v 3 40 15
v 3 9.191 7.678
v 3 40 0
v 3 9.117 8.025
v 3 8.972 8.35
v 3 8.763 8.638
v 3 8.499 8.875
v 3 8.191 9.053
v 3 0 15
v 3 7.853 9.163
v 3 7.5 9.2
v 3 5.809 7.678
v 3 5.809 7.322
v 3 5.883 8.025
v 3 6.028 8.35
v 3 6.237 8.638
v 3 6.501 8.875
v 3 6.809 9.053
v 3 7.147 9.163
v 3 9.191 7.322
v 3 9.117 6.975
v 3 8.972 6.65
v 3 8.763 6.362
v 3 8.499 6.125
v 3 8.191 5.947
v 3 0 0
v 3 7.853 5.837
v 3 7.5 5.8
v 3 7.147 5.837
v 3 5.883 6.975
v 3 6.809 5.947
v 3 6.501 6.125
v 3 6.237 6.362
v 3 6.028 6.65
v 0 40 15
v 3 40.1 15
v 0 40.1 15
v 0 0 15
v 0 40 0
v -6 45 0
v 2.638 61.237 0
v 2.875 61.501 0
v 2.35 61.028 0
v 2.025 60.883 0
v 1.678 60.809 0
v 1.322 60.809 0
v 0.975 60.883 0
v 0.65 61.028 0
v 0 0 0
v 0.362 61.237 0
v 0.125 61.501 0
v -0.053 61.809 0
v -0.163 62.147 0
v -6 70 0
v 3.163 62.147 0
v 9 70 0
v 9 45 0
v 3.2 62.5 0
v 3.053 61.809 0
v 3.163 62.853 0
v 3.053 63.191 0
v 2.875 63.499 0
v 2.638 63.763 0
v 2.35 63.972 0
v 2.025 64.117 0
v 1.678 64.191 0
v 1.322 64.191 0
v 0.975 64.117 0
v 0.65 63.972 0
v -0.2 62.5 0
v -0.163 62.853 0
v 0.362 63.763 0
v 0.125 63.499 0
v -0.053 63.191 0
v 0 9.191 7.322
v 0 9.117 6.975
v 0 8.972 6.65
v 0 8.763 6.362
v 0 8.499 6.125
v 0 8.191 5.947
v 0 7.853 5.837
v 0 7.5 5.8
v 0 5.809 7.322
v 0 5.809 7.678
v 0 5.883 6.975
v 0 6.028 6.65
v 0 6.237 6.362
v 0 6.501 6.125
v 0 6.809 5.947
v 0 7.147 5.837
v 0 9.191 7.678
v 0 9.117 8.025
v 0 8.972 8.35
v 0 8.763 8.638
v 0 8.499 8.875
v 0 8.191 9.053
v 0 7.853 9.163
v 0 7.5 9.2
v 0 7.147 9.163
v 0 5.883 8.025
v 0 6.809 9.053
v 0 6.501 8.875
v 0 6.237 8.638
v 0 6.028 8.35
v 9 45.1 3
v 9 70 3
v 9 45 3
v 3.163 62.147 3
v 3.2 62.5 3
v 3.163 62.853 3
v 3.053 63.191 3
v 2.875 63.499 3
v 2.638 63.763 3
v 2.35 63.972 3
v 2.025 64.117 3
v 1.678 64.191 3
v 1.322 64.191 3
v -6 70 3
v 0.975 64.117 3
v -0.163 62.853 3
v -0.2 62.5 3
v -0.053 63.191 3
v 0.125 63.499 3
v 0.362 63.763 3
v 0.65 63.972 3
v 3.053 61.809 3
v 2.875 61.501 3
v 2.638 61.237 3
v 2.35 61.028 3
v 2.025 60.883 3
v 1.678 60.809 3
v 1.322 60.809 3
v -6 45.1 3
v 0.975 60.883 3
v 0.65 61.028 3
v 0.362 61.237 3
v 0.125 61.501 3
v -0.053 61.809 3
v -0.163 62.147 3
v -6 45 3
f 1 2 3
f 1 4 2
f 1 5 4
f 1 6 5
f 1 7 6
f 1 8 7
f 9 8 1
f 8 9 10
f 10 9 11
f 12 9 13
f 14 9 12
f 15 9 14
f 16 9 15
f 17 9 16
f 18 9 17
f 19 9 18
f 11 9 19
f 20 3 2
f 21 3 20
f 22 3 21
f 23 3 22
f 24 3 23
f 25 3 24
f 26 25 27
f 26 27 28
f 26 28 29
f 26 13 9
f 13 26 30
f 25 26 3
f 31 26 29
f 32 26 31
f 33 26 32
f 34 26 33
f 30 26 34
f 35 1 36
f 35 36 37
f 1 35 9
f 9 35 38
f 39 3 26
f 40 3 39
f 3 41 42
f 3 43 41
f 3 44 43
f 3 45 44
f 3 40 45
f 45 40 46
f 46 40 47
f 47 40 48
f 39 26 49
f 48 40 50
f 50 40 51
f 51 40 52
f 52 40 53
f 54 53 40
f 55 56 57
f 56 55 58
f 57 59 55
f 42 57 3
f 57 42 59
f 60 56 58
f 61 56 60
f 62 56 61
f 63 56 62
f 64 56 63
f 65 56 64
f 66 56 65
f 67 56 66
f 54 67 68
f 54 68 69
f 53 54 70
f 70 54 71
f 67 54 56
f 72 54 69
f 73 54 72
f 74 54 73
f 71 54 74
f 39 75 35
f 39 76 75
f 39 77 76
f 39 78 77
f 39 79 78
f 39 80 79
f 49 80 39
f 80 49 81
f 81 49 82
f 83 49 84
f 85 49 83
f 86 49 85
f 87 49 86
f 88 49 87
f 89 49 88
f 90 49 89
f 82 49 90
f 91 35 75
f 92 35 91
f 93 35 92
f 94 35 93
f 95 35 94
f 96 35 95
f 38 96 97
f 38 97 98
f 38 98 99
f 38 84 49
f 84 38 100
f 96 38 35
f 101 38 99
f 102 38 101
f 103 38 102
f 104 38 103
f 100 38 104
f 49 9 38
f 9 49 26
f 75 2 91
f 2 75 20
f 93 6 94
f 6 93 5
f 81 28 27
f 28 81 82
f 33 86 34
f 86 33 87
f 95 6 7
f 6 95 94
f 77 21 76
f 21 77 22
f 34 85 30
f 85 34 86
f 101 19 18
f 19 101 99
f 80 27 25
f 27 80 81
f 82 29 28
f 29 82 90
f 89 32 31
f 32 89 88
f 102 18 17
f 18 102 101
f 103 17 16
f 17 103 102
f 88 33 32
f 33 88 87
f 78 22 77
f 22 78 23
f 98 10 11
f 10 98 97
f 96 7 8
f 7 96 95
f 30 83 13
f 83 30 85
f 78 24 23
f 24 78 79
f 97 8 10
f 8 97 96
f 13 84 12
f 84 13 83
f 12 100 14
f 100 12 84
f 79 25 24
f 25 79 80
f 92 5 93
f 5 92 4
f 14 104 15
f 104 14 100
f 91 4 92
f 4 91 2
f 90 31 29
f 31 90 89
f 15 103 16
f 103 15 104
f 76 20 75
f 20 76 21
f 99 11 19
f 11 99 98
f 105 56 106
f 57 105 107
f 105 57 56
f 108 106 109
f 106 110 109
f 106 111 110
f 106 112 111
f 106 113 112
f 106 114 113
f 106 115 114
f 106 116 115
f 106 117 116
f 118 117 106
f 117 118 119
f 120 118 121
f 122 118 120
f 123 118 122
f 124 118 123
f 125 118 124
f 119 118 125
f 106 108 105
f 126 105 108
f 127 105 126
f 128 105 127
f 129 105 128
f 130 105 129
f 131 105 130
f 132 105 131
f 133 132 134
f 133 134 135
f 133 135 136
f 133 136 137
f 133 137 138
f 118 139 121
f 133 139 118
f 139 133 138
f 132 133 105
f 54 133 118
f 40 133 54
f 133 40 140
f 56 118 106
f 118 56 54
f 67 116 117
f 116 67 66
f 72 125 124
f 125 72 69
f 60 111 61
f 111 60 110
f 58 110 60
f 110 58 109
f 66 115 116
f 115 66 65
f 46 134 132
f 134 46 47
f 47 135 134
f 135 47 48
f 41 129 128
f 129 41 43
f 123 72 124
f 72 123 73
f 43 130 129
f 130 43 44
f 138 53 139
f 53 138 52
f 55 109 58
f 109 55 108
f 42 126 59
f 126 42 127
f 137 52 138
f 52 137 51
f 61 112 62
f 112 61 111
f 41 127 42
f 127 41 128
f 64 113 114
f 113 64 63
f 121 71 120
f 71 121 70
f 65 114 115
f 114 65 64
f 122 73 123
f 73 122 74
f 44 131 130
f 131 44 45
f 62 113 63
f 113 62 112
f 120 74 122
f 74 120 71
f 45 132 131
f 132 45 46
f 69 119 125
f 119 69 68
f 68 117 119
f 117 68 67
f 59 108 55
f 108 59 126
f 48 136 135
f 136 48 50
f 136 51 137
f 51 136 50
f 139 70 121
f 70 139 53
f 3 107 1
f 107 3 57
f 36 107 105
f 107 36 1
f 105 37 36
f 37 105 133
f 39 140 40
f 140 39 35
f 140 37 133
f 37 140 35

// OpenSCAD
// Smalluseful thing to attach... something to something.

LEN_1 = 40;
LEN_2 = 25;
LEN_MID = 5;
THICKNESS = 3;
HEIGHT = 15;
THREAD_R = 3.40/2;

difference() {
    cube([THICKNESS, LEN_1, HEIGHT]);
    
    translate([0, HEIGHT/2, HEIGHT/2])
    rotate([0, 90, 0])
    cylinder(THICKNESS+1, THREAD_R, THREAD_R, $fn=30);
   
}



hull() {
    translate([0, LEN_1, 0])
    cube([THICKNESS, 0.1, HEIGHT]);

    translate([-HEIGHT/2+THICKNESS/2, LEN_1+LEN_MID, 0])
    cube([HEIGHT, 0.1, THICKNESS]);
}

difference() {
    translate([-HEIGHT/2+THICKNESS/2, LEN_1+LEN_MID, 0])
    cube([HEIGHT, LEN_2, THICKNESS]);
    
    translate([THICKNESS/2, LEN_1+LEN_MID+LEN_2-HEIGHT/2, 0])
    cylinder(THICKNESS+1, THREAD_R, THREAD_R, $fn=30);
}
